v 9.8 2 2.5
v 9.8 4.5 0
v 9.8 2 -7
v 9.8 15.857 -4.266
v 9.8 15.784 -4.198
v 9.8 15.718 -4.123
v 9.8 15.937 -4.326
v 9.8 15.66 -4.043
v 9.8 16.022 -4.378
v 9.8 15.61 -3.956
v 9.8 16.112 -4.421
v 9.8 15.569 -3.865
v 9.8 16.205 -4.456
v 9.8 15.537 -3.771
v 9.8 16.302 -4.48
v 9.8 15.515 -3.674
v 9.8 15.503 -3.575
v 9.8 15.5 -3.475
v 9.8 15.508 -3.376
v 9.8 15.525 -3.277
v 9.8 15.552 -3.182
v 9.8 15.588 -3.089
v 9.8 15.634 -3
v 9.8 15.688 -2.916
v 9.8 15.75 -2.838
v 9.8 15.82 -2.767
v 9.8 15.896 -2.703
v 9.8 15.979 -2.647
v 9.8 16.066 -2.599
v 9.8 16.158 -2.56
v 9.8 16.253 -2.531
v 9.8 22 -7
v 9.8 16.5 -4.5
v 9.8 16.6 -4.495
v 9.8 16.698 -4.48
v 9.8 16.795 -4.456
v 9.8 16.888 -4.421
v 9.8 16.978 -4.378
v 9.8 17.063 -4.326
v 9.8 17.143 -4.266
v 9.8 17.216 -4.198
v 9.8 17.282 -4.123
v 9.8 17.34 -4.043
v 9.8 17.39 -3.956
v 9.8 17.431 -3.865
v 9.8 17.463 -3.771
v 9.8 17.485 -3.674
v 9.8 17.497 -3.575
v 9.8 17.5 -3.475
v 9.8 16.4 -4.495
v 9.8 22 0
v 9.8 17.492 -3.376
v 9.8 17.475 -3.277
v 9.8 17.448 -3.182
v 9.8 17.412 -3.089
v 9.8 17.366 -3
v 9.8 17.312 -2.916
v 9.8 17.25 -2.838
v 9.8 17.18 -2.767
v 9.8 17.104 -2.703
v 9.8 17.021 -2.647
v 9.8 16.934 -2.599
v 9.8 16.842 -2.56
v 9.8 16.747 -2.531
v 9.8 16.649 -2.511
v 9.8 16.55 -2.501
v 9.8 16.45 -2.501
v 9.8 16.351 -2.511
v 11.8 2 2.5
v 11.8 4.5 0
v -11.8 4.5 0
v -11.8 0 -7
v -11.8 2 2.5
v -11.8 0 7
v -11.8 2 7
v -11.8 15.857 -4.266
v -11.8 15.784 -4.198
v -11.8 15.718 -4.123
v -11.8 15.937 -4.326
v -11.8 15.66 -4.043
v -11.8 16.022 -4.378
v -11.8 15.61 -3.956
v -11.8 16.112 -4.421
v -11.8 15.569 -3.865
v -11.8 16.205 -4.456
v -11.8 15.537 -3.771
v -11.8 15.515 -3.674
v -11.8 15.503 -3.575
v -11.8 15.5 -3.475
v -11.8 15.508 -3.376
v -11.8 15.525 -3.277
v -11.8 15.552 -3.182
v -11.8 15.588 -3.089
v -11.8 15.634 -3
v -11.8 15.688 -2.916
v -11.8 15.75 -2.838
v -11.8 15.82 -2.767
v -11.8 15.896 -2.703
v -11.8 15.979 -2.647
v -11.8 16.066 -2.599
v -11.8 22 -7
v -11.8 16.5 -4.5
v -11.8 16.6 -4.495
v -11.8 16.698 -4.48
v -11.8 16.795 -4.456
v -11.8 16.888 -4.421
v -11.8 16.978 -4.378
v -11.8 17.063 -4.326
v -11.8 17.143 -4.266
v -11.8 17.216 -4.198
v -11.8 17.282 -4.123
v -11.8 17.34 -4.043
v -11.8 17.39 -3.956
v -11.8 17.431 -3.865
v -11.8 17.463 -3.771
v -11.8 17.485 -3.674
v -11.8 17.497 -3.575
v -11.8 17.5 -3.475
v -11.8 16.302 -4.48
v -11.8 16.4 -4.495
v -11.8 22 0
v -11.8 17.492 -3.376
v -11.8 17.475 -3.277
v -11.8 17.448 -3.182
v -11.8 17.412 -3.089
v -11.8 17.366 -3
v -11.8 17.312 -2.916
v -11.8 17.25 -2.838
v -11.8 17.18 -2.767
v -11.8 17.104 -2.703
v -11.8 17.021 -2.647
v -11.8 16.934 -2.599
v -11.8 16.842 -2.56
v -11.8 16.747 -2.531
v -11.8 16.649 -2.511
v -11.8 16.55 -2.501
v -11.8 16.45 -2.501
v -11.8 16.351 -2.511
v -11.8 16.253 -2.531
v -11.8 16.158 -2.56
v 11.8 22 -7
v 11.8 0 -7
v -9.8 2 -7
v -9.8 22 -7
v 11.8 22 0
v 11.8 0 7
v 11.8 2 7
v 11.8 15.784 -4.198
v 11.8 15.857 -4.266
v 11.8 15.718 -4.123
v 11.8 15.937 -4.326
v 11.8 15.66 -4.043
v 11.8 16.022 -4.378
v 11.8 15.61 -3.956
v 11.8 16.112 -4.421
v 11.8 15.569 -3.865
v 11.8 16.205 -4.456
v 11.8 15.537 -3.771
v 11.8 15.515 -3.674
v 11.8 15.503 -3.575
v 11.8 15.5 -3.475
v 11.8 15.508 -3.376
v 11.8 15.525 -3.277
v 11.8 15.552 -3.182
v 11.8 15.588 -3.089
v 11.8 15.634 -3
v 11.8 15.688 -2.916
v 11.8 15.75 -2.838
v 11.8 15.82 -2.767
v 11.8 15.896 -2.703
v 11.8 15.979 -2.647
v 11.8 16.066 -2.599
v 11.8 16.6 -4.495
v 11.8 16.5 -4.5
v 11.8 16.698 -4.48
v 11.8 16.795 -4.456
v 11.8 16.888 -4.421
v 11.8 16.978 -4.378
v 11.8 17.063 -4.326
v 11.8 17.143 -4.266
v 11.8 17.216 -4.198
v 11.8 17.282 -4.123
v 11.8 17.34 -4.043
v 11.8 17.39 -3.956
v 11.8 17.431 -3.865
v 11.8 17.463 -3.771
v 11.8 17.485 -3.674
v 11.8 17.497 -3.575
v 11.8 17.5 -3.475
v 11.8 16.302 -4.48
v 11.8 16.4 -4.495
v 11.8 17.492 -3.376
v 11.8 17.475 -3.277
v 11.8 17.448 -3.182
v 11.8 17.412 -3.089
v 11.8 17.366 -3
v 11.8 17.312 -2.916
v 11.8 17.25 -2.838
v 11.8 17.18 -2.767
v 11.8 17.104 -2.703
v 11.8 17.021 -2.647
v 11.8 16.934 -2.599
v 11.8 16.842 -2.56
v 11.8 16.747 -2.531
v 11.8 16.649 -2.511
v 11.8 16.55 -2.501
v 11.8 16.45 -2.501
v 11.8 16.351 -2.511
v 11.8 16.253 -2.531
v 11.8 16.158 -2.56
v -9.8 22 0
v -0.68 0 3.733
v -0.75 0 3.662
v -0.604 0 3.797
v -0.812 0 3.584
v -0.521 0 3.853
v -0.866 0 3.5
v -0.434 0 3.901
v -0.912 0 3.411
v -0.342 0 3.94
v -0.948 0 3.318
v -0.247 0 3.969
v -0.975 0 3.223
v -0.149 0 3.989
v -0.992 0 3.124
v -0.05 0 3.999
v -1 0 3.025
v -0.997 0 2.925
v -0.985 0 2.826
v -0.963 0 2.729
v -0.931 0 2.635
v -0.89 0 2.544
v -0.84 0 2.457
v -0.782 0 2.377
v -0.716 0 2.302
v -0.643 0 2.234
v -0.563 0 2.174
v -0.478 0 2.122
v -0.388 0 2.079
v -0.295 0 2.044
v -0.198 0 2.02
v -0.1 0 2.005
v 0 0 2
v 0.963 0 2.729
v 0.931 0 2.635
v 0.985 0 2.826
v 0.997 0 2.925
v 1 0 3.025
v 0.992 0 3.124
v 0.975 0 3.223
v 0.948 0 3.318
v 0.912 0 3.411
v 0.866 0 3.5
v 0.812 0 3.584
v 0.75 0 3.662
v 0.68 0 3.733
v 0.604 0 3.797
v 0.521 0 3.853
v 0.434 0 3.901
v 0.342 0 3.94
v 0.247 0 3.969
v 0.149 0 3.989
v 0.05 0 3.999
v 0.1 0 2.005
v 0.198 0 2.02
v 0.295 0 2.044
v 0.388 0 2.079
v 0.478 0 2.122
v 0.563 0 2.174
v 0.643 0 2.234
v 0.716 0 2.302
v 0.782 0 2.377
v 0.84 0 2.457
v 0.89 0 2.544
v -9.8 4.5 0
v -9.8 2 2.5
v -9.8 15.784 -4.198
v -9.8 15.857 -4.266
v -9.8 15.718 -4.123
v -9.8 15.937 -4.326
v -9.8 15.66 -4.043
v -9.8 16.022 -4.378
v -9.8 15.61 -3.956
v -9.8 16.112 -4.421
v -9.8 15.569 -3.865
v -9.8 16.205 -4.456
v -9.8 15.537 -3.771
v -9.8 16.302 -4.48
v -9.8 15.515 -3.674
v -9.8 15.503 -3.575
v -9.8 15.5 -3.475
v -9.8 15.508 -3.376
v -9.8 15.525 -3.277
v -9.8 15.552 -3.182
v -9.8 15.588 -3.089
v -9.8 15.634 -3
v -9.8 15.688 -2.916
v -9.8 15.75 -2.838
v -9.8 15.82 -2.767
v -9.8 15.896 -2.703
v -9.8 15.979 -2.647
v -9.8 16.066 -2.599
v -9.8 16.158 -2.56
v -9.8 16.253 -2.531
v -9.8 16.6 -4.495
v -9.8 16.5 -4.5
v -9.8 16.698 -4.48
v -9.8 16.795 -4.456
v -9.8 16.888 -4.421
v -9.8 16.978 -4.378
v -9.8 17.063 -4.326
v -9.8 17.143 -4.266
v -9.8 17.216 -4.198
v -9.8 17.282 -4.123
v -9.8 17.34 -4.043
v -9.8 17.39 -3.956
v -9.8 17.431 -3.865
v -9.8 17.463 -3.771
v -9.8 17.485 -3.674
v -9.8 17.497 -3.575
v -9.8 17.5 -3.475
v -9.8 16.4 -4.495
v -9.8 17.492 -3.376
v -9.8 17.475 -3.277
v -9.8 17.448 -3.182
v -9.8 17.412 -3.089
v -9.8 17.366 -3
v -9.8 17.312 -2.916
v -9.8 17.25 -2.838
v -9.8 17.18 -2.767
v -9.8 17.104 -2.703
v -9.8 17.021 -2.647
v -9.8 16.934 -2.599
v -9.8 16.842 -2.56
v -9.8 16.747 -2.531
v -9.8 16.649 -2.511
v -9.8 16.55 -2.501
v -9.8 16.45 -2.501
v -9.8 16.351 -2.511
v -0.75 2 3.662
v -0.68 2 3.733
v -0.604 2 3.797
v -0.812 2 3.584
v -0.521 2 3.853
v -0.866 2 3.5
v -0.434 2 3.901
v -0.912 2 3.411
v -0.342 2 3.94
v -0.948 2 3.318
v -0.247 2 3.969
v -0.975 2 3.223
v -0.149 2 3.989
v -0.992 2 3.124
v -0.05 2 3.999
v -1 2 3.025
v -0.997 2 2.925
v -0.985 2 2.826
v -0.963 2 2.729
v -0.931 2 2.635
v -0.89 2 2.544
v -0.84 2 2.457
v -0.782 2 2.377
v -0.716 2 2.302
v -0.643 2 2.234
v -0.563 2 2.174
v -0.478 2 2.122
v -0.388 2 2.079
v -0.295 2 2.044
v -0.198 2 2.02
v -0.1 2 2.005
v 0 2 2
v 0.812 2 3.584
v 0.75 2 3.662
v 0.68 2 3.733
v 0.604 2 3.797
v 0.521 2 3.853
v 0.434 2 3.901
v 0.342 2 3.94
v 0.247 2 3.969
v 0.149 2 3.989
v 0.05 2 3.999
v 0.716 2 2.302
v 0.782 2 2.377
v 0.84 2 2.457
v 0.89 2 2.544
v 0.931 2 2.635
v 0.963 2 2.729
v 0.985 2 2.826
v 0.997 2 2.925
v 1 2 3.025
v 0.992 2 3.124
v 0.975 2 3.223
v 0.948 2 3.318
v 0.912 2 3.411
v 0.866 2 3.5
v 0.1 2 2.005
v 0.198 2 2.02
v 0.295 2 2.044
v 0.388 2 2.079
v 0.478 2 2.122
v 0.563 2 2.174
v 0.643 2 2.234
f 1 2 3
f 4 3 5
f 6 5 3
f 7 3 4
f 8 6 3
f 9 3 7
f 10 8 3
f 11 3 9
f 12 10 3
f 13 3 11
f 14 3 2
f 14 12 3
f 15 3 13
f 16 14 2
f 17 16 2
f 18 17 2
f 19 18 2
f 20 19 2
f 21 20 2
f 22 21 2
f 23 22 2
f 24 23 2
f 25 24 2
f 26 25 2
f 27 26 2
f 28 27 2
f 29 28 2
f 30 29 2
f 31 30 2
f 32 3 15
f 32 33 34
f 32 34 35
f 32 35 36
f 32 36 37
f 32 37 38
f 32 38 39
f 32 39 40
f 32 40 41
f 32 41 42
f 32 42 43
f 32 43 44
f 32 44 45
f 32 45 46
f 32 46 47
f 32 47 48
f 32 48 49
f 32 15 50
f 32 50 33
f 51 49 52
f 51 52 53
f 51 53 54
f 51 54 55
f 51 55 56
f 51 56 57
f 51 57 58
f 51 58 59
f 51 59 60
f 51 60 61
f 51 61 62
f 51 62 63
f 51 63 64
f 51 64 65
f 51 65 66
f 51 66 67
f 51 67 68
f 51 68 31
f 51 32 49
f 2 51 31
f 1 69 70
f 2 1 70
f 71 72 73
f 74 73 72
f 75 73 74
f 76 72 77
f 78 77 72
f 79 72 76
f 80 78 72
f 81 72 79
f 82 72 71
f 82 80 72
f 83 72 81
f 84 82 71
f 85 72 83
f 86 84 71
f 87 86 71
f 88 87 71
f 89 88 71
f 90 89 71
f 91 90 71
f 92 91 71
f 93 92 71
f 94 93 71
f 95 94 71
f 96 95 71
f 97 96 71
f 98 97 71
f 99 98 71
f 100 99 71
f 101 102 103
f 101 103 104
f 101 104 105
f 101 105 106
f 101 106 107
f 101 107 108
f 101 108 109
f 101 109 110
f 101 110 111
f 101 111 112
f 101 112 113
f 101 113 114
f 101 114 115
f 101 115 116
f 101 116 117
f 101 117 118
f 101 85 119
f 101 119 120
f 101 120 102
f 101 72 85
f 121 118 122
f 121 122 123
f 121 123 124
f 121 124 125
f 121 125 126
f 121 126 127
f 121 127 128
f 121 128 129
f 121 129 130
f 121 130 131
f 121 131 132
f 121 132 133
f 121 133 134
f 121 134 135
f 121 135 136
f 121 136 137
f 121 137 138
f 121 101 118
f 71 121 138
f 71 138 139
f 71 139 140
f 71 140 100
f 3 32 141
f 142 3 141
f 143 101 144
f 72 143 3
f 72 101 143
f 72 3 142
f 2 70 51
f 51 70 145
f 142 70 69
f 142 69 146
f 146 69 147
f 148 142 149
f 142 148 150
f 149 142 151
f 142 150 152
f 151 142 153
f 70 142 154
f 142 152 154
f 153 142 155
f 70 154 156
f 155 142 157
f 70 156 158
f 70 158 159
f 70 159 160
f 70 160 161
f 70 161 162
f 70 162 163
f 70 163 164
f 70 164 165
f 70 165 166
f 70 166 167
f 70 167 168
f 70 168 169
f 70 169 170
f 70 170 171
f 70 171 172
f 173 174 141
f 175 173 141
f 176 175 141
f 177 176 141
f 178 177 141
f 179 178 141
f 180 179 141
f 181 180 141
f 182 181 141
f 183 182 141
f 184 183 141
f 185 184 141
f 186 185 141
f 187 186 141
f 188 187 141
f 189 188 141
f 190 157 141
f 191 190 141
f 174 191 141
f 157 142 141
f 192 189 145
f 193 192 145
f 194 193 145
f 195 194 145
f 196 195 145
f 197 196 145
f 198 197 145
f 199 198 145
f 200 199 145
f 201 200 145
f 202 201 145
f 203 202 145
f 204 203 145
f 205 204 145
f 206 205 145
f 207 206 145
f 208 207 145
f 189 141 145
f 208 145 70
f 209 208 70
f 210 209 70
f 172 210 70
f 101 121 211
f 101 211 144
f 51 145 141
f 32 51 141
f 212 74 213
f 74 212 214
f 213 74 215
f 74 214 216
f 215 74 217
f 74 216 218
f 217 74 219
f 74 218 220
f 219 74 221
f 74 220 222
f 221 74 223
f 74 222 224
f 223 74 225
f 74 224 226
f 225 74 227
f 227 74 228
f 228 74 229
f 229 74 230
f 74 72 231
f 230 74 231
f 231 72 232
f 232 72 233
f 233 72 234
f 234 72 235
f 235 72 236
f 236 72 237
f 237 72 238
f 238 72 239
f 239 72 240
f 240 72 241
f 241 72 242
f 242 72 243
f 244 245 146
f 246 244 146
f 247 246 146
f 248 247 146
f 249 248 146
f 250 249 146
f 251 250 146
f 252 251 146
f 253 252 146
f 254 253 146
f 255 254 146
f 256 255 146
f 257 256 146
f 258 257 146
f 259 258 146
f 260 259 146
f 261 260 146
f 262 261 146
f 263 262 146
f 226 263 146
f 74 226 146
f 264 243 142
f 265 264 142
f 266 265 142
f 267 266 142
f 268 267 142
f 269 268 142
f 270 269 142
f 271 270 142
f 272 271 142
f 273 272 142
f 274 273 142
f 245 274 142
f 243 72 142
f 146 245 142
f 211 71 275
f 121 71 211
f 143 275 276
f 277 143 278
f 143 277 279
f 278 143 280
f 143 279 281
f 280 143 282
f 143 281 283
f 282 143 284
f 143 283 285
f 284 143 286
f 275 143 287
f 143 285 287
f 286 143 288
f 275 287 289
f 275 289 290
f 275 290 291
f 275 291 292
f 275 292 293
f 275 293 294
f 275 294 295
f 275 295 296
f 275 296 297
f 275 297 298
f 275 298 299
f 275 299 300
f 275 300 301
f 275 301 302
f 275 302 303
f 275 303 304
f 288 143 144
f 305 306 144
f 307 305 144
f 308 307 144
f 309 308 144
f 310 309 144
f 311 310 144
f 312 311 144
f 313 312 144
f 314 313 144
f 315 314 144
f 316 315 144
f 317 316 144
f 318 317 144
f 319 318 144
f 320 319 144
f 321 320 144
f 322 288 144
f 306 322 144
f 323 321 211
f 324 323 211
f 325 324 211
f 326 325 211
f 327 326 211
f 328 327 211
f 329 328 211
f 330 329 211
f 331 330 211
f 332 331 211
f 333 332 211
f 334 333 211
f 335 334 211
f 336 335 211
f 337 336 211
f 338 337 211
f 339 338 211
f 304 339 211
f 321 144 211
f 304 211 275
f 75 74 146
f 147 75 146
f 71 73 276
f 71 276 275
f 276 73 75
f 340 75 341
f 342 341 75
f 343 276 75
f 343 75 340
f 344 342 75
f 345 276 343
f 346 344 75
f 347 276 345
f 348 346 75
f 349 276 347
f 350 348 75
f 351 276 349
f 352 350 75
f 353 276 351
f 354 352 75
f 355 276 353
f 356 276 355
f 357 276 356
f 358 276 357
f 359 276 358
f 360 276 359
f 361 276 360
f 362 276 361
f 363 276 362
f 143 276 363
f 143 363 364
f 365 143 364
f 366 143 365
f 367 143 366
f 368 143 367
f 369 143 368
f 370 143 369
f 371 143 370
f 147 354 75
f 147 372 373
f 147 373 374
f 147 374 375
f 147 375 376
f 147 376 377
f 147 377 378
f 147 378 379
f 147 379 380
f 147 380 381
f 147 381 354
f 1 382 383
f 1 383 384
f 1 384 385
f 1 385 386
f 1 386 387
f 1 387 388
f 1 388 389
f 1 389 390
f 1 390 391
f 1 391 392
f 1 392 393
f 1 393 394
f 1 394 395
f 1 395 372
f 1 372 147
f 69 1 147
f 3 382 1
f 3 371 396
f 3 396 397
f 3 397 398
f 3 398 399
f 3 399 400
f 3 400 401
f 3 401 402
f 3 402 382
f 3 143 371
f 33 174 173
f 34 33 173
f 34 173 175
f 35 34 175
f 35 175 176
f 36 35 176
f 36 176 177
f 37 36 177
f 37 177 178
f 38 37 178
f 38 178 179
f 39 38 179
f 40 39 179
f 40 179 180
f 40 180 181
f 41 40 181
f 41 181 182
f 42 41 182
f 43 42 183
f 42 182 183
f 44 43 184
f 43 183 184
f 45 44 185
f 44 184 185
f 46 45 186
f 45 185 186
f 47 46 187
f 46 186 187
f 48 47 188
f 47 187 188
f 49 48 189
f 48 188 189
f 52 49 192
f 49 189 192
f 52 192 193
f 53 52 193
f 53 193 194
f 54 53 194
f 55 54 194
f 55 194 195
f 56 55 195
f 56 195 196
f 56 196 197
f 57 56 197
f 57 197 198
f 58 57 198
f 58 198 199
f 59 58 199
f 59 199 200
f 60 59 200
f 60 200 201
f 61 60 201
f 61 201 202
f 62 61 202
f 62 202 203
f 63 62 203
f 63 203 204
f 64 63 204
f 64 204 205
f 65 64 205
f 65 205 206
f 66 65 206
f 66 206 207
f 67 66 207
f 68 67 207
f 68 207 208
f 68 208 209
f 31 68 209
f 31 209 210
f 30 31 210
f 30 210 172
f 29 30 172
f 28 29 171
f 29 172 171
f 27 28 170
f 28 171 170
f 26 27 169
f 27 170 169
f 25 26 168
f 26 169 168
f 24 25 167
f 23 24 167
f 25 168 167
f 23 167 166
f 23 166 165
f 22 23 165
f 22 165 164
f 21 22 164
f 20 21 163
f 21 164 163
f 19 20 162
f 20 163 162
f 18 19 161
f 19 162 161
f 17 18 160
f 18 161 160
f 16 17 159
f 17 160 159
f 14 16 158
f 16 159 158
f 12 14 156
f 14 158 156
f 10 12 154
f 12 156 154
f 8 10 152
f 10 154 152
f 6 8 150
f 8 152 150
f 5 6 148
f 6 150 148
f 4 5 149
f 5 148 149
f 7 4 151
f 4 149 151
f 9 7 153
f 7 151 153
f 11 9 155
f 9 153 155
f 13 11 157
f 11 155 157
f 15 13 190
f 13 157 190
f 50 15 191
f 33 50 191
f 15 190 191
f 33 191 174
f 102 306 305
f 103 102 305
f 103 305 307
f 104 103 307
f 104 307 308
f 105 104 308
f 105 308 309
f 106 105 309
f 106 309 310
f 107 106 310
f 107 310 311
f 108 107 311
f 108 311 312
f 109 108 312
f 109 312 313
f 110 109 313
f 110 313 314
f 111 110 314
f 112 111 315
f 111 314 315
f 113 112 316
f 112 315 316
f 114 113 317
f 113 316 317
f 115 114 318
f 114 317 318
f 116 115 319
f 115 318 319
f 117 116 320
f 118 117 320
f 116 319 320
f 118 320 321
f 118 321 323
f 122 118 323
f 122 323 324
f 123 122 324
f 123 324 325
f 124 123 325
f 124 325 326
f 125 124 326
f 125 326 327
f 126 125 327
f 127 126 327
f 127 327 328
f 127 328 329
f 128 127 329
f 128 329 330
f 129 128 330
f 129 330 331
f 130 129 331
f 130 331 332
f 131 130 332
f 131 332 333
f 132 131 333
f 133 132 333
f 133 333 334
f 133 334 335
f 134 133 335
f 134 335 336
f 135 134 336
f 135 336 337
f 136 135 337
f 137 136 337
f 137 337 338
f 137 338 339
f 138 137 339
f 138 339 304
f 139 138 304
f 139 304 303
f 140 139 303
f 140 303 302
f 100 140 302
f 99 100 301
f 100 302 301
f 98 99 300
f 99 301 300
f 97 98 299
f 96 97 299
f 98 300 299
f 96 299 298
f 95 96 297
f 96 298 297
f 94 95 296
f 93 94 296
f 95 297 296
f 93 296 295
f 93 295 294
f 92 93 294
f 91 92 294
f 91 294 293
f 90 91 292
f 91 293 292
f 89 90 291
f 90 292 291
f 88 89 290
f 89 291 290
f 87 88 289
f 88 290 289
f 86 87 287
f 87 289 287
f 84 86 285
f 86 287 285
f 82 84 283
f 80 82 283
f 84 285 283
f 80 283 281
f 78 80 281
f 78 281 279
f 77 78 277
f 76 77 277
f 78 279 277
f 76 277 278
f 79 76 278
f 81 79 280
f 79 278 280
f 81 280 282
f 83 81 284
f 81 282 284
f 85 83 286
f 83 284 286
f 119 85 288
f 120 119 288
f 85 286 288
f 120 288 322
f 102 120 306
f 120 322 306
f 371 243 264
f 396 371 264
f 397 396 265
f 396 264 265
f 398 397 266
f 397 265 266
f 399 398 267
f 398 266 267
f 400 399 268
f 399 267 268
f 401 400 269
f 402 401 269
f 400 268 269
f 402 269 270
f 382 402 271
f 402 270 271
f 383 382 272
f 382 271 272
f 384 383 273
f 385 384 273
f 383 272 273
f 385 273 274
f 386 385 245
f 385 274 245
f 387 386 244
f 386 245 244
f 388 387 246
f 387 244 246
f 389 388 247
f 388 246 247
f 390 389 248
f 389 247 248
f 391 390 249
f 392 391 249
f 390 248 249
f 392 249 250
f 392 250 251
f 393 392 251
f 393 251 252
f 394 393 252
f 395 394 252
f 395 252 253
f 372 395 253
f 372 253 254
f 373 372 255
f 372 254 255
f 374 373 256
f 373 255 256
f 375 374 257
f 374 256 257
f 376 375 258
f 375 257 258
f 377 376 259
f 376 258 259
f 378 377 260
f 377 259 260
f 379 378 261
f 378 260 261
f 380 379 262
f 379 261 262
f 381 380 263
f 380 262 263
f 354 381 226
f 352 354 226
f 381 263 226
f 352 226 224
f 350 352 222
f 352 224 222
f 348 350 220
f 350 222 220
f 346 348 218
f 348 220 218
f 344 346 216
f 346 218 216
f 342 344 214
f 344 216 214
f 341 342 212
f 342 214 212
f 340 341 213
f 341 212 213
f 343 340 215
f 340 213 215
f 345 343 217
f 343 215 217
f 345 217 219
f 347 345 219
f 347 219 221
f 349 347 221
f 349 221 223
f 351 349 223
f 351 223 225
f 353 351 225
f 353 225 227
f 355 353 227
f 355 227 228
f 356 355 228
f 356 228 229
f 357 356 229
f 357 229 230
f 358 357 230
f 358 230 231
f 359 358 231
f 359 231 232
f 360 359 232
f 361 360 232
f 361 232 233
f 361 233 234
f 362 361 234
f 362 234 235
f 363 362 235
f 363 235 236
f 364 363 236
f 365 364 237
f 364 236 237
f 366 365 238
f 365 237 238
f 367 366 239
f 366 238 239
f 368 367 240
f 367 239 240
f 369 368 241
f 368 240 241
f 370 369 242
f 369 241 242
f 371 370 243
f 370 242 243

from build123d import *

# Parameters (mm, degrees)
SKETCH1_W           = 23.6
SKETCH1_H           = 14
BOSS_EXTRUDE1_DEPTH = 2
BOSS_EXTRUDE2_DEPTH = 2
BOSS_EXTRUDE3_DEPTH = 2
SKETCH4_R           = 1
CUT_EXTRUDE1_DEPTH  = 2
SKETCH5_R           = 1
CUT_EXTRUDE2_DEPTH  = 34.01454225


with BuildPart() as part:
    # Sketch1 → Boss-Extrude1 (new body)
    with BuildSketch(Plane(origin=(0, 0, 0), x_dir=(1, 0, 0), z_dir=(0, 1, 0))):
        Rectangle(SKETCH1_W, SKETCH1_H)
    extrude(amount=BOSS_EXTRUDE1_DEPTH)

    # Sketch2 → Boss-Extrude2 (add)
    with BuildSketch(Plane(origin=(11.8, 0, 0), x_dir=(0, 0, -1), z_dir=(1, 0, 0))):
        Polygon((7, 2), (0, 2), (-2.5, 2), (0, 4.5), (0, 22), (7, 22), align=None)
    extrude(amount=-BOSS_EXTRUDE2_DEPTH)

    # Sketch3 → Boss-Extrude3 (add)
    with BuildSketch(Plane.ZY.offset(11.8)):
        Polygon((-7, 22), (-7, 2), (2.5, 2), (0, 4.5), (0, 22), align=None)
    extrude(amount=-BOSS_EXTRUDE3_DEPTH)

    # Sketch4 → Cut-Extrude1 (cut)
    with BuildSketch(Plane.XZ):
        with Locations(Location((0, 3, 0), (0, 0, 270))):
            Circle(SKETCH4_R)
    extrude(amount=-CUT_EXTRUDE1_DEPTH, mode=Mode.SUBTRACT)

    # Sketch5 → Cut-Extrude2 (cut, through all)
    with BuildSketch(Plane(origin=(11.8, 0, 0), x_dir=(0, 0, -1), z_dir=(1, 0, 0))):
        with Locations((3.5, 16.5)):
            Circle(SKETCH5_R)
    extrude(amount=-CUT_EXTRUDE2_DEPTH, mode=Mode.SUBTRACT)


solid = part.part
